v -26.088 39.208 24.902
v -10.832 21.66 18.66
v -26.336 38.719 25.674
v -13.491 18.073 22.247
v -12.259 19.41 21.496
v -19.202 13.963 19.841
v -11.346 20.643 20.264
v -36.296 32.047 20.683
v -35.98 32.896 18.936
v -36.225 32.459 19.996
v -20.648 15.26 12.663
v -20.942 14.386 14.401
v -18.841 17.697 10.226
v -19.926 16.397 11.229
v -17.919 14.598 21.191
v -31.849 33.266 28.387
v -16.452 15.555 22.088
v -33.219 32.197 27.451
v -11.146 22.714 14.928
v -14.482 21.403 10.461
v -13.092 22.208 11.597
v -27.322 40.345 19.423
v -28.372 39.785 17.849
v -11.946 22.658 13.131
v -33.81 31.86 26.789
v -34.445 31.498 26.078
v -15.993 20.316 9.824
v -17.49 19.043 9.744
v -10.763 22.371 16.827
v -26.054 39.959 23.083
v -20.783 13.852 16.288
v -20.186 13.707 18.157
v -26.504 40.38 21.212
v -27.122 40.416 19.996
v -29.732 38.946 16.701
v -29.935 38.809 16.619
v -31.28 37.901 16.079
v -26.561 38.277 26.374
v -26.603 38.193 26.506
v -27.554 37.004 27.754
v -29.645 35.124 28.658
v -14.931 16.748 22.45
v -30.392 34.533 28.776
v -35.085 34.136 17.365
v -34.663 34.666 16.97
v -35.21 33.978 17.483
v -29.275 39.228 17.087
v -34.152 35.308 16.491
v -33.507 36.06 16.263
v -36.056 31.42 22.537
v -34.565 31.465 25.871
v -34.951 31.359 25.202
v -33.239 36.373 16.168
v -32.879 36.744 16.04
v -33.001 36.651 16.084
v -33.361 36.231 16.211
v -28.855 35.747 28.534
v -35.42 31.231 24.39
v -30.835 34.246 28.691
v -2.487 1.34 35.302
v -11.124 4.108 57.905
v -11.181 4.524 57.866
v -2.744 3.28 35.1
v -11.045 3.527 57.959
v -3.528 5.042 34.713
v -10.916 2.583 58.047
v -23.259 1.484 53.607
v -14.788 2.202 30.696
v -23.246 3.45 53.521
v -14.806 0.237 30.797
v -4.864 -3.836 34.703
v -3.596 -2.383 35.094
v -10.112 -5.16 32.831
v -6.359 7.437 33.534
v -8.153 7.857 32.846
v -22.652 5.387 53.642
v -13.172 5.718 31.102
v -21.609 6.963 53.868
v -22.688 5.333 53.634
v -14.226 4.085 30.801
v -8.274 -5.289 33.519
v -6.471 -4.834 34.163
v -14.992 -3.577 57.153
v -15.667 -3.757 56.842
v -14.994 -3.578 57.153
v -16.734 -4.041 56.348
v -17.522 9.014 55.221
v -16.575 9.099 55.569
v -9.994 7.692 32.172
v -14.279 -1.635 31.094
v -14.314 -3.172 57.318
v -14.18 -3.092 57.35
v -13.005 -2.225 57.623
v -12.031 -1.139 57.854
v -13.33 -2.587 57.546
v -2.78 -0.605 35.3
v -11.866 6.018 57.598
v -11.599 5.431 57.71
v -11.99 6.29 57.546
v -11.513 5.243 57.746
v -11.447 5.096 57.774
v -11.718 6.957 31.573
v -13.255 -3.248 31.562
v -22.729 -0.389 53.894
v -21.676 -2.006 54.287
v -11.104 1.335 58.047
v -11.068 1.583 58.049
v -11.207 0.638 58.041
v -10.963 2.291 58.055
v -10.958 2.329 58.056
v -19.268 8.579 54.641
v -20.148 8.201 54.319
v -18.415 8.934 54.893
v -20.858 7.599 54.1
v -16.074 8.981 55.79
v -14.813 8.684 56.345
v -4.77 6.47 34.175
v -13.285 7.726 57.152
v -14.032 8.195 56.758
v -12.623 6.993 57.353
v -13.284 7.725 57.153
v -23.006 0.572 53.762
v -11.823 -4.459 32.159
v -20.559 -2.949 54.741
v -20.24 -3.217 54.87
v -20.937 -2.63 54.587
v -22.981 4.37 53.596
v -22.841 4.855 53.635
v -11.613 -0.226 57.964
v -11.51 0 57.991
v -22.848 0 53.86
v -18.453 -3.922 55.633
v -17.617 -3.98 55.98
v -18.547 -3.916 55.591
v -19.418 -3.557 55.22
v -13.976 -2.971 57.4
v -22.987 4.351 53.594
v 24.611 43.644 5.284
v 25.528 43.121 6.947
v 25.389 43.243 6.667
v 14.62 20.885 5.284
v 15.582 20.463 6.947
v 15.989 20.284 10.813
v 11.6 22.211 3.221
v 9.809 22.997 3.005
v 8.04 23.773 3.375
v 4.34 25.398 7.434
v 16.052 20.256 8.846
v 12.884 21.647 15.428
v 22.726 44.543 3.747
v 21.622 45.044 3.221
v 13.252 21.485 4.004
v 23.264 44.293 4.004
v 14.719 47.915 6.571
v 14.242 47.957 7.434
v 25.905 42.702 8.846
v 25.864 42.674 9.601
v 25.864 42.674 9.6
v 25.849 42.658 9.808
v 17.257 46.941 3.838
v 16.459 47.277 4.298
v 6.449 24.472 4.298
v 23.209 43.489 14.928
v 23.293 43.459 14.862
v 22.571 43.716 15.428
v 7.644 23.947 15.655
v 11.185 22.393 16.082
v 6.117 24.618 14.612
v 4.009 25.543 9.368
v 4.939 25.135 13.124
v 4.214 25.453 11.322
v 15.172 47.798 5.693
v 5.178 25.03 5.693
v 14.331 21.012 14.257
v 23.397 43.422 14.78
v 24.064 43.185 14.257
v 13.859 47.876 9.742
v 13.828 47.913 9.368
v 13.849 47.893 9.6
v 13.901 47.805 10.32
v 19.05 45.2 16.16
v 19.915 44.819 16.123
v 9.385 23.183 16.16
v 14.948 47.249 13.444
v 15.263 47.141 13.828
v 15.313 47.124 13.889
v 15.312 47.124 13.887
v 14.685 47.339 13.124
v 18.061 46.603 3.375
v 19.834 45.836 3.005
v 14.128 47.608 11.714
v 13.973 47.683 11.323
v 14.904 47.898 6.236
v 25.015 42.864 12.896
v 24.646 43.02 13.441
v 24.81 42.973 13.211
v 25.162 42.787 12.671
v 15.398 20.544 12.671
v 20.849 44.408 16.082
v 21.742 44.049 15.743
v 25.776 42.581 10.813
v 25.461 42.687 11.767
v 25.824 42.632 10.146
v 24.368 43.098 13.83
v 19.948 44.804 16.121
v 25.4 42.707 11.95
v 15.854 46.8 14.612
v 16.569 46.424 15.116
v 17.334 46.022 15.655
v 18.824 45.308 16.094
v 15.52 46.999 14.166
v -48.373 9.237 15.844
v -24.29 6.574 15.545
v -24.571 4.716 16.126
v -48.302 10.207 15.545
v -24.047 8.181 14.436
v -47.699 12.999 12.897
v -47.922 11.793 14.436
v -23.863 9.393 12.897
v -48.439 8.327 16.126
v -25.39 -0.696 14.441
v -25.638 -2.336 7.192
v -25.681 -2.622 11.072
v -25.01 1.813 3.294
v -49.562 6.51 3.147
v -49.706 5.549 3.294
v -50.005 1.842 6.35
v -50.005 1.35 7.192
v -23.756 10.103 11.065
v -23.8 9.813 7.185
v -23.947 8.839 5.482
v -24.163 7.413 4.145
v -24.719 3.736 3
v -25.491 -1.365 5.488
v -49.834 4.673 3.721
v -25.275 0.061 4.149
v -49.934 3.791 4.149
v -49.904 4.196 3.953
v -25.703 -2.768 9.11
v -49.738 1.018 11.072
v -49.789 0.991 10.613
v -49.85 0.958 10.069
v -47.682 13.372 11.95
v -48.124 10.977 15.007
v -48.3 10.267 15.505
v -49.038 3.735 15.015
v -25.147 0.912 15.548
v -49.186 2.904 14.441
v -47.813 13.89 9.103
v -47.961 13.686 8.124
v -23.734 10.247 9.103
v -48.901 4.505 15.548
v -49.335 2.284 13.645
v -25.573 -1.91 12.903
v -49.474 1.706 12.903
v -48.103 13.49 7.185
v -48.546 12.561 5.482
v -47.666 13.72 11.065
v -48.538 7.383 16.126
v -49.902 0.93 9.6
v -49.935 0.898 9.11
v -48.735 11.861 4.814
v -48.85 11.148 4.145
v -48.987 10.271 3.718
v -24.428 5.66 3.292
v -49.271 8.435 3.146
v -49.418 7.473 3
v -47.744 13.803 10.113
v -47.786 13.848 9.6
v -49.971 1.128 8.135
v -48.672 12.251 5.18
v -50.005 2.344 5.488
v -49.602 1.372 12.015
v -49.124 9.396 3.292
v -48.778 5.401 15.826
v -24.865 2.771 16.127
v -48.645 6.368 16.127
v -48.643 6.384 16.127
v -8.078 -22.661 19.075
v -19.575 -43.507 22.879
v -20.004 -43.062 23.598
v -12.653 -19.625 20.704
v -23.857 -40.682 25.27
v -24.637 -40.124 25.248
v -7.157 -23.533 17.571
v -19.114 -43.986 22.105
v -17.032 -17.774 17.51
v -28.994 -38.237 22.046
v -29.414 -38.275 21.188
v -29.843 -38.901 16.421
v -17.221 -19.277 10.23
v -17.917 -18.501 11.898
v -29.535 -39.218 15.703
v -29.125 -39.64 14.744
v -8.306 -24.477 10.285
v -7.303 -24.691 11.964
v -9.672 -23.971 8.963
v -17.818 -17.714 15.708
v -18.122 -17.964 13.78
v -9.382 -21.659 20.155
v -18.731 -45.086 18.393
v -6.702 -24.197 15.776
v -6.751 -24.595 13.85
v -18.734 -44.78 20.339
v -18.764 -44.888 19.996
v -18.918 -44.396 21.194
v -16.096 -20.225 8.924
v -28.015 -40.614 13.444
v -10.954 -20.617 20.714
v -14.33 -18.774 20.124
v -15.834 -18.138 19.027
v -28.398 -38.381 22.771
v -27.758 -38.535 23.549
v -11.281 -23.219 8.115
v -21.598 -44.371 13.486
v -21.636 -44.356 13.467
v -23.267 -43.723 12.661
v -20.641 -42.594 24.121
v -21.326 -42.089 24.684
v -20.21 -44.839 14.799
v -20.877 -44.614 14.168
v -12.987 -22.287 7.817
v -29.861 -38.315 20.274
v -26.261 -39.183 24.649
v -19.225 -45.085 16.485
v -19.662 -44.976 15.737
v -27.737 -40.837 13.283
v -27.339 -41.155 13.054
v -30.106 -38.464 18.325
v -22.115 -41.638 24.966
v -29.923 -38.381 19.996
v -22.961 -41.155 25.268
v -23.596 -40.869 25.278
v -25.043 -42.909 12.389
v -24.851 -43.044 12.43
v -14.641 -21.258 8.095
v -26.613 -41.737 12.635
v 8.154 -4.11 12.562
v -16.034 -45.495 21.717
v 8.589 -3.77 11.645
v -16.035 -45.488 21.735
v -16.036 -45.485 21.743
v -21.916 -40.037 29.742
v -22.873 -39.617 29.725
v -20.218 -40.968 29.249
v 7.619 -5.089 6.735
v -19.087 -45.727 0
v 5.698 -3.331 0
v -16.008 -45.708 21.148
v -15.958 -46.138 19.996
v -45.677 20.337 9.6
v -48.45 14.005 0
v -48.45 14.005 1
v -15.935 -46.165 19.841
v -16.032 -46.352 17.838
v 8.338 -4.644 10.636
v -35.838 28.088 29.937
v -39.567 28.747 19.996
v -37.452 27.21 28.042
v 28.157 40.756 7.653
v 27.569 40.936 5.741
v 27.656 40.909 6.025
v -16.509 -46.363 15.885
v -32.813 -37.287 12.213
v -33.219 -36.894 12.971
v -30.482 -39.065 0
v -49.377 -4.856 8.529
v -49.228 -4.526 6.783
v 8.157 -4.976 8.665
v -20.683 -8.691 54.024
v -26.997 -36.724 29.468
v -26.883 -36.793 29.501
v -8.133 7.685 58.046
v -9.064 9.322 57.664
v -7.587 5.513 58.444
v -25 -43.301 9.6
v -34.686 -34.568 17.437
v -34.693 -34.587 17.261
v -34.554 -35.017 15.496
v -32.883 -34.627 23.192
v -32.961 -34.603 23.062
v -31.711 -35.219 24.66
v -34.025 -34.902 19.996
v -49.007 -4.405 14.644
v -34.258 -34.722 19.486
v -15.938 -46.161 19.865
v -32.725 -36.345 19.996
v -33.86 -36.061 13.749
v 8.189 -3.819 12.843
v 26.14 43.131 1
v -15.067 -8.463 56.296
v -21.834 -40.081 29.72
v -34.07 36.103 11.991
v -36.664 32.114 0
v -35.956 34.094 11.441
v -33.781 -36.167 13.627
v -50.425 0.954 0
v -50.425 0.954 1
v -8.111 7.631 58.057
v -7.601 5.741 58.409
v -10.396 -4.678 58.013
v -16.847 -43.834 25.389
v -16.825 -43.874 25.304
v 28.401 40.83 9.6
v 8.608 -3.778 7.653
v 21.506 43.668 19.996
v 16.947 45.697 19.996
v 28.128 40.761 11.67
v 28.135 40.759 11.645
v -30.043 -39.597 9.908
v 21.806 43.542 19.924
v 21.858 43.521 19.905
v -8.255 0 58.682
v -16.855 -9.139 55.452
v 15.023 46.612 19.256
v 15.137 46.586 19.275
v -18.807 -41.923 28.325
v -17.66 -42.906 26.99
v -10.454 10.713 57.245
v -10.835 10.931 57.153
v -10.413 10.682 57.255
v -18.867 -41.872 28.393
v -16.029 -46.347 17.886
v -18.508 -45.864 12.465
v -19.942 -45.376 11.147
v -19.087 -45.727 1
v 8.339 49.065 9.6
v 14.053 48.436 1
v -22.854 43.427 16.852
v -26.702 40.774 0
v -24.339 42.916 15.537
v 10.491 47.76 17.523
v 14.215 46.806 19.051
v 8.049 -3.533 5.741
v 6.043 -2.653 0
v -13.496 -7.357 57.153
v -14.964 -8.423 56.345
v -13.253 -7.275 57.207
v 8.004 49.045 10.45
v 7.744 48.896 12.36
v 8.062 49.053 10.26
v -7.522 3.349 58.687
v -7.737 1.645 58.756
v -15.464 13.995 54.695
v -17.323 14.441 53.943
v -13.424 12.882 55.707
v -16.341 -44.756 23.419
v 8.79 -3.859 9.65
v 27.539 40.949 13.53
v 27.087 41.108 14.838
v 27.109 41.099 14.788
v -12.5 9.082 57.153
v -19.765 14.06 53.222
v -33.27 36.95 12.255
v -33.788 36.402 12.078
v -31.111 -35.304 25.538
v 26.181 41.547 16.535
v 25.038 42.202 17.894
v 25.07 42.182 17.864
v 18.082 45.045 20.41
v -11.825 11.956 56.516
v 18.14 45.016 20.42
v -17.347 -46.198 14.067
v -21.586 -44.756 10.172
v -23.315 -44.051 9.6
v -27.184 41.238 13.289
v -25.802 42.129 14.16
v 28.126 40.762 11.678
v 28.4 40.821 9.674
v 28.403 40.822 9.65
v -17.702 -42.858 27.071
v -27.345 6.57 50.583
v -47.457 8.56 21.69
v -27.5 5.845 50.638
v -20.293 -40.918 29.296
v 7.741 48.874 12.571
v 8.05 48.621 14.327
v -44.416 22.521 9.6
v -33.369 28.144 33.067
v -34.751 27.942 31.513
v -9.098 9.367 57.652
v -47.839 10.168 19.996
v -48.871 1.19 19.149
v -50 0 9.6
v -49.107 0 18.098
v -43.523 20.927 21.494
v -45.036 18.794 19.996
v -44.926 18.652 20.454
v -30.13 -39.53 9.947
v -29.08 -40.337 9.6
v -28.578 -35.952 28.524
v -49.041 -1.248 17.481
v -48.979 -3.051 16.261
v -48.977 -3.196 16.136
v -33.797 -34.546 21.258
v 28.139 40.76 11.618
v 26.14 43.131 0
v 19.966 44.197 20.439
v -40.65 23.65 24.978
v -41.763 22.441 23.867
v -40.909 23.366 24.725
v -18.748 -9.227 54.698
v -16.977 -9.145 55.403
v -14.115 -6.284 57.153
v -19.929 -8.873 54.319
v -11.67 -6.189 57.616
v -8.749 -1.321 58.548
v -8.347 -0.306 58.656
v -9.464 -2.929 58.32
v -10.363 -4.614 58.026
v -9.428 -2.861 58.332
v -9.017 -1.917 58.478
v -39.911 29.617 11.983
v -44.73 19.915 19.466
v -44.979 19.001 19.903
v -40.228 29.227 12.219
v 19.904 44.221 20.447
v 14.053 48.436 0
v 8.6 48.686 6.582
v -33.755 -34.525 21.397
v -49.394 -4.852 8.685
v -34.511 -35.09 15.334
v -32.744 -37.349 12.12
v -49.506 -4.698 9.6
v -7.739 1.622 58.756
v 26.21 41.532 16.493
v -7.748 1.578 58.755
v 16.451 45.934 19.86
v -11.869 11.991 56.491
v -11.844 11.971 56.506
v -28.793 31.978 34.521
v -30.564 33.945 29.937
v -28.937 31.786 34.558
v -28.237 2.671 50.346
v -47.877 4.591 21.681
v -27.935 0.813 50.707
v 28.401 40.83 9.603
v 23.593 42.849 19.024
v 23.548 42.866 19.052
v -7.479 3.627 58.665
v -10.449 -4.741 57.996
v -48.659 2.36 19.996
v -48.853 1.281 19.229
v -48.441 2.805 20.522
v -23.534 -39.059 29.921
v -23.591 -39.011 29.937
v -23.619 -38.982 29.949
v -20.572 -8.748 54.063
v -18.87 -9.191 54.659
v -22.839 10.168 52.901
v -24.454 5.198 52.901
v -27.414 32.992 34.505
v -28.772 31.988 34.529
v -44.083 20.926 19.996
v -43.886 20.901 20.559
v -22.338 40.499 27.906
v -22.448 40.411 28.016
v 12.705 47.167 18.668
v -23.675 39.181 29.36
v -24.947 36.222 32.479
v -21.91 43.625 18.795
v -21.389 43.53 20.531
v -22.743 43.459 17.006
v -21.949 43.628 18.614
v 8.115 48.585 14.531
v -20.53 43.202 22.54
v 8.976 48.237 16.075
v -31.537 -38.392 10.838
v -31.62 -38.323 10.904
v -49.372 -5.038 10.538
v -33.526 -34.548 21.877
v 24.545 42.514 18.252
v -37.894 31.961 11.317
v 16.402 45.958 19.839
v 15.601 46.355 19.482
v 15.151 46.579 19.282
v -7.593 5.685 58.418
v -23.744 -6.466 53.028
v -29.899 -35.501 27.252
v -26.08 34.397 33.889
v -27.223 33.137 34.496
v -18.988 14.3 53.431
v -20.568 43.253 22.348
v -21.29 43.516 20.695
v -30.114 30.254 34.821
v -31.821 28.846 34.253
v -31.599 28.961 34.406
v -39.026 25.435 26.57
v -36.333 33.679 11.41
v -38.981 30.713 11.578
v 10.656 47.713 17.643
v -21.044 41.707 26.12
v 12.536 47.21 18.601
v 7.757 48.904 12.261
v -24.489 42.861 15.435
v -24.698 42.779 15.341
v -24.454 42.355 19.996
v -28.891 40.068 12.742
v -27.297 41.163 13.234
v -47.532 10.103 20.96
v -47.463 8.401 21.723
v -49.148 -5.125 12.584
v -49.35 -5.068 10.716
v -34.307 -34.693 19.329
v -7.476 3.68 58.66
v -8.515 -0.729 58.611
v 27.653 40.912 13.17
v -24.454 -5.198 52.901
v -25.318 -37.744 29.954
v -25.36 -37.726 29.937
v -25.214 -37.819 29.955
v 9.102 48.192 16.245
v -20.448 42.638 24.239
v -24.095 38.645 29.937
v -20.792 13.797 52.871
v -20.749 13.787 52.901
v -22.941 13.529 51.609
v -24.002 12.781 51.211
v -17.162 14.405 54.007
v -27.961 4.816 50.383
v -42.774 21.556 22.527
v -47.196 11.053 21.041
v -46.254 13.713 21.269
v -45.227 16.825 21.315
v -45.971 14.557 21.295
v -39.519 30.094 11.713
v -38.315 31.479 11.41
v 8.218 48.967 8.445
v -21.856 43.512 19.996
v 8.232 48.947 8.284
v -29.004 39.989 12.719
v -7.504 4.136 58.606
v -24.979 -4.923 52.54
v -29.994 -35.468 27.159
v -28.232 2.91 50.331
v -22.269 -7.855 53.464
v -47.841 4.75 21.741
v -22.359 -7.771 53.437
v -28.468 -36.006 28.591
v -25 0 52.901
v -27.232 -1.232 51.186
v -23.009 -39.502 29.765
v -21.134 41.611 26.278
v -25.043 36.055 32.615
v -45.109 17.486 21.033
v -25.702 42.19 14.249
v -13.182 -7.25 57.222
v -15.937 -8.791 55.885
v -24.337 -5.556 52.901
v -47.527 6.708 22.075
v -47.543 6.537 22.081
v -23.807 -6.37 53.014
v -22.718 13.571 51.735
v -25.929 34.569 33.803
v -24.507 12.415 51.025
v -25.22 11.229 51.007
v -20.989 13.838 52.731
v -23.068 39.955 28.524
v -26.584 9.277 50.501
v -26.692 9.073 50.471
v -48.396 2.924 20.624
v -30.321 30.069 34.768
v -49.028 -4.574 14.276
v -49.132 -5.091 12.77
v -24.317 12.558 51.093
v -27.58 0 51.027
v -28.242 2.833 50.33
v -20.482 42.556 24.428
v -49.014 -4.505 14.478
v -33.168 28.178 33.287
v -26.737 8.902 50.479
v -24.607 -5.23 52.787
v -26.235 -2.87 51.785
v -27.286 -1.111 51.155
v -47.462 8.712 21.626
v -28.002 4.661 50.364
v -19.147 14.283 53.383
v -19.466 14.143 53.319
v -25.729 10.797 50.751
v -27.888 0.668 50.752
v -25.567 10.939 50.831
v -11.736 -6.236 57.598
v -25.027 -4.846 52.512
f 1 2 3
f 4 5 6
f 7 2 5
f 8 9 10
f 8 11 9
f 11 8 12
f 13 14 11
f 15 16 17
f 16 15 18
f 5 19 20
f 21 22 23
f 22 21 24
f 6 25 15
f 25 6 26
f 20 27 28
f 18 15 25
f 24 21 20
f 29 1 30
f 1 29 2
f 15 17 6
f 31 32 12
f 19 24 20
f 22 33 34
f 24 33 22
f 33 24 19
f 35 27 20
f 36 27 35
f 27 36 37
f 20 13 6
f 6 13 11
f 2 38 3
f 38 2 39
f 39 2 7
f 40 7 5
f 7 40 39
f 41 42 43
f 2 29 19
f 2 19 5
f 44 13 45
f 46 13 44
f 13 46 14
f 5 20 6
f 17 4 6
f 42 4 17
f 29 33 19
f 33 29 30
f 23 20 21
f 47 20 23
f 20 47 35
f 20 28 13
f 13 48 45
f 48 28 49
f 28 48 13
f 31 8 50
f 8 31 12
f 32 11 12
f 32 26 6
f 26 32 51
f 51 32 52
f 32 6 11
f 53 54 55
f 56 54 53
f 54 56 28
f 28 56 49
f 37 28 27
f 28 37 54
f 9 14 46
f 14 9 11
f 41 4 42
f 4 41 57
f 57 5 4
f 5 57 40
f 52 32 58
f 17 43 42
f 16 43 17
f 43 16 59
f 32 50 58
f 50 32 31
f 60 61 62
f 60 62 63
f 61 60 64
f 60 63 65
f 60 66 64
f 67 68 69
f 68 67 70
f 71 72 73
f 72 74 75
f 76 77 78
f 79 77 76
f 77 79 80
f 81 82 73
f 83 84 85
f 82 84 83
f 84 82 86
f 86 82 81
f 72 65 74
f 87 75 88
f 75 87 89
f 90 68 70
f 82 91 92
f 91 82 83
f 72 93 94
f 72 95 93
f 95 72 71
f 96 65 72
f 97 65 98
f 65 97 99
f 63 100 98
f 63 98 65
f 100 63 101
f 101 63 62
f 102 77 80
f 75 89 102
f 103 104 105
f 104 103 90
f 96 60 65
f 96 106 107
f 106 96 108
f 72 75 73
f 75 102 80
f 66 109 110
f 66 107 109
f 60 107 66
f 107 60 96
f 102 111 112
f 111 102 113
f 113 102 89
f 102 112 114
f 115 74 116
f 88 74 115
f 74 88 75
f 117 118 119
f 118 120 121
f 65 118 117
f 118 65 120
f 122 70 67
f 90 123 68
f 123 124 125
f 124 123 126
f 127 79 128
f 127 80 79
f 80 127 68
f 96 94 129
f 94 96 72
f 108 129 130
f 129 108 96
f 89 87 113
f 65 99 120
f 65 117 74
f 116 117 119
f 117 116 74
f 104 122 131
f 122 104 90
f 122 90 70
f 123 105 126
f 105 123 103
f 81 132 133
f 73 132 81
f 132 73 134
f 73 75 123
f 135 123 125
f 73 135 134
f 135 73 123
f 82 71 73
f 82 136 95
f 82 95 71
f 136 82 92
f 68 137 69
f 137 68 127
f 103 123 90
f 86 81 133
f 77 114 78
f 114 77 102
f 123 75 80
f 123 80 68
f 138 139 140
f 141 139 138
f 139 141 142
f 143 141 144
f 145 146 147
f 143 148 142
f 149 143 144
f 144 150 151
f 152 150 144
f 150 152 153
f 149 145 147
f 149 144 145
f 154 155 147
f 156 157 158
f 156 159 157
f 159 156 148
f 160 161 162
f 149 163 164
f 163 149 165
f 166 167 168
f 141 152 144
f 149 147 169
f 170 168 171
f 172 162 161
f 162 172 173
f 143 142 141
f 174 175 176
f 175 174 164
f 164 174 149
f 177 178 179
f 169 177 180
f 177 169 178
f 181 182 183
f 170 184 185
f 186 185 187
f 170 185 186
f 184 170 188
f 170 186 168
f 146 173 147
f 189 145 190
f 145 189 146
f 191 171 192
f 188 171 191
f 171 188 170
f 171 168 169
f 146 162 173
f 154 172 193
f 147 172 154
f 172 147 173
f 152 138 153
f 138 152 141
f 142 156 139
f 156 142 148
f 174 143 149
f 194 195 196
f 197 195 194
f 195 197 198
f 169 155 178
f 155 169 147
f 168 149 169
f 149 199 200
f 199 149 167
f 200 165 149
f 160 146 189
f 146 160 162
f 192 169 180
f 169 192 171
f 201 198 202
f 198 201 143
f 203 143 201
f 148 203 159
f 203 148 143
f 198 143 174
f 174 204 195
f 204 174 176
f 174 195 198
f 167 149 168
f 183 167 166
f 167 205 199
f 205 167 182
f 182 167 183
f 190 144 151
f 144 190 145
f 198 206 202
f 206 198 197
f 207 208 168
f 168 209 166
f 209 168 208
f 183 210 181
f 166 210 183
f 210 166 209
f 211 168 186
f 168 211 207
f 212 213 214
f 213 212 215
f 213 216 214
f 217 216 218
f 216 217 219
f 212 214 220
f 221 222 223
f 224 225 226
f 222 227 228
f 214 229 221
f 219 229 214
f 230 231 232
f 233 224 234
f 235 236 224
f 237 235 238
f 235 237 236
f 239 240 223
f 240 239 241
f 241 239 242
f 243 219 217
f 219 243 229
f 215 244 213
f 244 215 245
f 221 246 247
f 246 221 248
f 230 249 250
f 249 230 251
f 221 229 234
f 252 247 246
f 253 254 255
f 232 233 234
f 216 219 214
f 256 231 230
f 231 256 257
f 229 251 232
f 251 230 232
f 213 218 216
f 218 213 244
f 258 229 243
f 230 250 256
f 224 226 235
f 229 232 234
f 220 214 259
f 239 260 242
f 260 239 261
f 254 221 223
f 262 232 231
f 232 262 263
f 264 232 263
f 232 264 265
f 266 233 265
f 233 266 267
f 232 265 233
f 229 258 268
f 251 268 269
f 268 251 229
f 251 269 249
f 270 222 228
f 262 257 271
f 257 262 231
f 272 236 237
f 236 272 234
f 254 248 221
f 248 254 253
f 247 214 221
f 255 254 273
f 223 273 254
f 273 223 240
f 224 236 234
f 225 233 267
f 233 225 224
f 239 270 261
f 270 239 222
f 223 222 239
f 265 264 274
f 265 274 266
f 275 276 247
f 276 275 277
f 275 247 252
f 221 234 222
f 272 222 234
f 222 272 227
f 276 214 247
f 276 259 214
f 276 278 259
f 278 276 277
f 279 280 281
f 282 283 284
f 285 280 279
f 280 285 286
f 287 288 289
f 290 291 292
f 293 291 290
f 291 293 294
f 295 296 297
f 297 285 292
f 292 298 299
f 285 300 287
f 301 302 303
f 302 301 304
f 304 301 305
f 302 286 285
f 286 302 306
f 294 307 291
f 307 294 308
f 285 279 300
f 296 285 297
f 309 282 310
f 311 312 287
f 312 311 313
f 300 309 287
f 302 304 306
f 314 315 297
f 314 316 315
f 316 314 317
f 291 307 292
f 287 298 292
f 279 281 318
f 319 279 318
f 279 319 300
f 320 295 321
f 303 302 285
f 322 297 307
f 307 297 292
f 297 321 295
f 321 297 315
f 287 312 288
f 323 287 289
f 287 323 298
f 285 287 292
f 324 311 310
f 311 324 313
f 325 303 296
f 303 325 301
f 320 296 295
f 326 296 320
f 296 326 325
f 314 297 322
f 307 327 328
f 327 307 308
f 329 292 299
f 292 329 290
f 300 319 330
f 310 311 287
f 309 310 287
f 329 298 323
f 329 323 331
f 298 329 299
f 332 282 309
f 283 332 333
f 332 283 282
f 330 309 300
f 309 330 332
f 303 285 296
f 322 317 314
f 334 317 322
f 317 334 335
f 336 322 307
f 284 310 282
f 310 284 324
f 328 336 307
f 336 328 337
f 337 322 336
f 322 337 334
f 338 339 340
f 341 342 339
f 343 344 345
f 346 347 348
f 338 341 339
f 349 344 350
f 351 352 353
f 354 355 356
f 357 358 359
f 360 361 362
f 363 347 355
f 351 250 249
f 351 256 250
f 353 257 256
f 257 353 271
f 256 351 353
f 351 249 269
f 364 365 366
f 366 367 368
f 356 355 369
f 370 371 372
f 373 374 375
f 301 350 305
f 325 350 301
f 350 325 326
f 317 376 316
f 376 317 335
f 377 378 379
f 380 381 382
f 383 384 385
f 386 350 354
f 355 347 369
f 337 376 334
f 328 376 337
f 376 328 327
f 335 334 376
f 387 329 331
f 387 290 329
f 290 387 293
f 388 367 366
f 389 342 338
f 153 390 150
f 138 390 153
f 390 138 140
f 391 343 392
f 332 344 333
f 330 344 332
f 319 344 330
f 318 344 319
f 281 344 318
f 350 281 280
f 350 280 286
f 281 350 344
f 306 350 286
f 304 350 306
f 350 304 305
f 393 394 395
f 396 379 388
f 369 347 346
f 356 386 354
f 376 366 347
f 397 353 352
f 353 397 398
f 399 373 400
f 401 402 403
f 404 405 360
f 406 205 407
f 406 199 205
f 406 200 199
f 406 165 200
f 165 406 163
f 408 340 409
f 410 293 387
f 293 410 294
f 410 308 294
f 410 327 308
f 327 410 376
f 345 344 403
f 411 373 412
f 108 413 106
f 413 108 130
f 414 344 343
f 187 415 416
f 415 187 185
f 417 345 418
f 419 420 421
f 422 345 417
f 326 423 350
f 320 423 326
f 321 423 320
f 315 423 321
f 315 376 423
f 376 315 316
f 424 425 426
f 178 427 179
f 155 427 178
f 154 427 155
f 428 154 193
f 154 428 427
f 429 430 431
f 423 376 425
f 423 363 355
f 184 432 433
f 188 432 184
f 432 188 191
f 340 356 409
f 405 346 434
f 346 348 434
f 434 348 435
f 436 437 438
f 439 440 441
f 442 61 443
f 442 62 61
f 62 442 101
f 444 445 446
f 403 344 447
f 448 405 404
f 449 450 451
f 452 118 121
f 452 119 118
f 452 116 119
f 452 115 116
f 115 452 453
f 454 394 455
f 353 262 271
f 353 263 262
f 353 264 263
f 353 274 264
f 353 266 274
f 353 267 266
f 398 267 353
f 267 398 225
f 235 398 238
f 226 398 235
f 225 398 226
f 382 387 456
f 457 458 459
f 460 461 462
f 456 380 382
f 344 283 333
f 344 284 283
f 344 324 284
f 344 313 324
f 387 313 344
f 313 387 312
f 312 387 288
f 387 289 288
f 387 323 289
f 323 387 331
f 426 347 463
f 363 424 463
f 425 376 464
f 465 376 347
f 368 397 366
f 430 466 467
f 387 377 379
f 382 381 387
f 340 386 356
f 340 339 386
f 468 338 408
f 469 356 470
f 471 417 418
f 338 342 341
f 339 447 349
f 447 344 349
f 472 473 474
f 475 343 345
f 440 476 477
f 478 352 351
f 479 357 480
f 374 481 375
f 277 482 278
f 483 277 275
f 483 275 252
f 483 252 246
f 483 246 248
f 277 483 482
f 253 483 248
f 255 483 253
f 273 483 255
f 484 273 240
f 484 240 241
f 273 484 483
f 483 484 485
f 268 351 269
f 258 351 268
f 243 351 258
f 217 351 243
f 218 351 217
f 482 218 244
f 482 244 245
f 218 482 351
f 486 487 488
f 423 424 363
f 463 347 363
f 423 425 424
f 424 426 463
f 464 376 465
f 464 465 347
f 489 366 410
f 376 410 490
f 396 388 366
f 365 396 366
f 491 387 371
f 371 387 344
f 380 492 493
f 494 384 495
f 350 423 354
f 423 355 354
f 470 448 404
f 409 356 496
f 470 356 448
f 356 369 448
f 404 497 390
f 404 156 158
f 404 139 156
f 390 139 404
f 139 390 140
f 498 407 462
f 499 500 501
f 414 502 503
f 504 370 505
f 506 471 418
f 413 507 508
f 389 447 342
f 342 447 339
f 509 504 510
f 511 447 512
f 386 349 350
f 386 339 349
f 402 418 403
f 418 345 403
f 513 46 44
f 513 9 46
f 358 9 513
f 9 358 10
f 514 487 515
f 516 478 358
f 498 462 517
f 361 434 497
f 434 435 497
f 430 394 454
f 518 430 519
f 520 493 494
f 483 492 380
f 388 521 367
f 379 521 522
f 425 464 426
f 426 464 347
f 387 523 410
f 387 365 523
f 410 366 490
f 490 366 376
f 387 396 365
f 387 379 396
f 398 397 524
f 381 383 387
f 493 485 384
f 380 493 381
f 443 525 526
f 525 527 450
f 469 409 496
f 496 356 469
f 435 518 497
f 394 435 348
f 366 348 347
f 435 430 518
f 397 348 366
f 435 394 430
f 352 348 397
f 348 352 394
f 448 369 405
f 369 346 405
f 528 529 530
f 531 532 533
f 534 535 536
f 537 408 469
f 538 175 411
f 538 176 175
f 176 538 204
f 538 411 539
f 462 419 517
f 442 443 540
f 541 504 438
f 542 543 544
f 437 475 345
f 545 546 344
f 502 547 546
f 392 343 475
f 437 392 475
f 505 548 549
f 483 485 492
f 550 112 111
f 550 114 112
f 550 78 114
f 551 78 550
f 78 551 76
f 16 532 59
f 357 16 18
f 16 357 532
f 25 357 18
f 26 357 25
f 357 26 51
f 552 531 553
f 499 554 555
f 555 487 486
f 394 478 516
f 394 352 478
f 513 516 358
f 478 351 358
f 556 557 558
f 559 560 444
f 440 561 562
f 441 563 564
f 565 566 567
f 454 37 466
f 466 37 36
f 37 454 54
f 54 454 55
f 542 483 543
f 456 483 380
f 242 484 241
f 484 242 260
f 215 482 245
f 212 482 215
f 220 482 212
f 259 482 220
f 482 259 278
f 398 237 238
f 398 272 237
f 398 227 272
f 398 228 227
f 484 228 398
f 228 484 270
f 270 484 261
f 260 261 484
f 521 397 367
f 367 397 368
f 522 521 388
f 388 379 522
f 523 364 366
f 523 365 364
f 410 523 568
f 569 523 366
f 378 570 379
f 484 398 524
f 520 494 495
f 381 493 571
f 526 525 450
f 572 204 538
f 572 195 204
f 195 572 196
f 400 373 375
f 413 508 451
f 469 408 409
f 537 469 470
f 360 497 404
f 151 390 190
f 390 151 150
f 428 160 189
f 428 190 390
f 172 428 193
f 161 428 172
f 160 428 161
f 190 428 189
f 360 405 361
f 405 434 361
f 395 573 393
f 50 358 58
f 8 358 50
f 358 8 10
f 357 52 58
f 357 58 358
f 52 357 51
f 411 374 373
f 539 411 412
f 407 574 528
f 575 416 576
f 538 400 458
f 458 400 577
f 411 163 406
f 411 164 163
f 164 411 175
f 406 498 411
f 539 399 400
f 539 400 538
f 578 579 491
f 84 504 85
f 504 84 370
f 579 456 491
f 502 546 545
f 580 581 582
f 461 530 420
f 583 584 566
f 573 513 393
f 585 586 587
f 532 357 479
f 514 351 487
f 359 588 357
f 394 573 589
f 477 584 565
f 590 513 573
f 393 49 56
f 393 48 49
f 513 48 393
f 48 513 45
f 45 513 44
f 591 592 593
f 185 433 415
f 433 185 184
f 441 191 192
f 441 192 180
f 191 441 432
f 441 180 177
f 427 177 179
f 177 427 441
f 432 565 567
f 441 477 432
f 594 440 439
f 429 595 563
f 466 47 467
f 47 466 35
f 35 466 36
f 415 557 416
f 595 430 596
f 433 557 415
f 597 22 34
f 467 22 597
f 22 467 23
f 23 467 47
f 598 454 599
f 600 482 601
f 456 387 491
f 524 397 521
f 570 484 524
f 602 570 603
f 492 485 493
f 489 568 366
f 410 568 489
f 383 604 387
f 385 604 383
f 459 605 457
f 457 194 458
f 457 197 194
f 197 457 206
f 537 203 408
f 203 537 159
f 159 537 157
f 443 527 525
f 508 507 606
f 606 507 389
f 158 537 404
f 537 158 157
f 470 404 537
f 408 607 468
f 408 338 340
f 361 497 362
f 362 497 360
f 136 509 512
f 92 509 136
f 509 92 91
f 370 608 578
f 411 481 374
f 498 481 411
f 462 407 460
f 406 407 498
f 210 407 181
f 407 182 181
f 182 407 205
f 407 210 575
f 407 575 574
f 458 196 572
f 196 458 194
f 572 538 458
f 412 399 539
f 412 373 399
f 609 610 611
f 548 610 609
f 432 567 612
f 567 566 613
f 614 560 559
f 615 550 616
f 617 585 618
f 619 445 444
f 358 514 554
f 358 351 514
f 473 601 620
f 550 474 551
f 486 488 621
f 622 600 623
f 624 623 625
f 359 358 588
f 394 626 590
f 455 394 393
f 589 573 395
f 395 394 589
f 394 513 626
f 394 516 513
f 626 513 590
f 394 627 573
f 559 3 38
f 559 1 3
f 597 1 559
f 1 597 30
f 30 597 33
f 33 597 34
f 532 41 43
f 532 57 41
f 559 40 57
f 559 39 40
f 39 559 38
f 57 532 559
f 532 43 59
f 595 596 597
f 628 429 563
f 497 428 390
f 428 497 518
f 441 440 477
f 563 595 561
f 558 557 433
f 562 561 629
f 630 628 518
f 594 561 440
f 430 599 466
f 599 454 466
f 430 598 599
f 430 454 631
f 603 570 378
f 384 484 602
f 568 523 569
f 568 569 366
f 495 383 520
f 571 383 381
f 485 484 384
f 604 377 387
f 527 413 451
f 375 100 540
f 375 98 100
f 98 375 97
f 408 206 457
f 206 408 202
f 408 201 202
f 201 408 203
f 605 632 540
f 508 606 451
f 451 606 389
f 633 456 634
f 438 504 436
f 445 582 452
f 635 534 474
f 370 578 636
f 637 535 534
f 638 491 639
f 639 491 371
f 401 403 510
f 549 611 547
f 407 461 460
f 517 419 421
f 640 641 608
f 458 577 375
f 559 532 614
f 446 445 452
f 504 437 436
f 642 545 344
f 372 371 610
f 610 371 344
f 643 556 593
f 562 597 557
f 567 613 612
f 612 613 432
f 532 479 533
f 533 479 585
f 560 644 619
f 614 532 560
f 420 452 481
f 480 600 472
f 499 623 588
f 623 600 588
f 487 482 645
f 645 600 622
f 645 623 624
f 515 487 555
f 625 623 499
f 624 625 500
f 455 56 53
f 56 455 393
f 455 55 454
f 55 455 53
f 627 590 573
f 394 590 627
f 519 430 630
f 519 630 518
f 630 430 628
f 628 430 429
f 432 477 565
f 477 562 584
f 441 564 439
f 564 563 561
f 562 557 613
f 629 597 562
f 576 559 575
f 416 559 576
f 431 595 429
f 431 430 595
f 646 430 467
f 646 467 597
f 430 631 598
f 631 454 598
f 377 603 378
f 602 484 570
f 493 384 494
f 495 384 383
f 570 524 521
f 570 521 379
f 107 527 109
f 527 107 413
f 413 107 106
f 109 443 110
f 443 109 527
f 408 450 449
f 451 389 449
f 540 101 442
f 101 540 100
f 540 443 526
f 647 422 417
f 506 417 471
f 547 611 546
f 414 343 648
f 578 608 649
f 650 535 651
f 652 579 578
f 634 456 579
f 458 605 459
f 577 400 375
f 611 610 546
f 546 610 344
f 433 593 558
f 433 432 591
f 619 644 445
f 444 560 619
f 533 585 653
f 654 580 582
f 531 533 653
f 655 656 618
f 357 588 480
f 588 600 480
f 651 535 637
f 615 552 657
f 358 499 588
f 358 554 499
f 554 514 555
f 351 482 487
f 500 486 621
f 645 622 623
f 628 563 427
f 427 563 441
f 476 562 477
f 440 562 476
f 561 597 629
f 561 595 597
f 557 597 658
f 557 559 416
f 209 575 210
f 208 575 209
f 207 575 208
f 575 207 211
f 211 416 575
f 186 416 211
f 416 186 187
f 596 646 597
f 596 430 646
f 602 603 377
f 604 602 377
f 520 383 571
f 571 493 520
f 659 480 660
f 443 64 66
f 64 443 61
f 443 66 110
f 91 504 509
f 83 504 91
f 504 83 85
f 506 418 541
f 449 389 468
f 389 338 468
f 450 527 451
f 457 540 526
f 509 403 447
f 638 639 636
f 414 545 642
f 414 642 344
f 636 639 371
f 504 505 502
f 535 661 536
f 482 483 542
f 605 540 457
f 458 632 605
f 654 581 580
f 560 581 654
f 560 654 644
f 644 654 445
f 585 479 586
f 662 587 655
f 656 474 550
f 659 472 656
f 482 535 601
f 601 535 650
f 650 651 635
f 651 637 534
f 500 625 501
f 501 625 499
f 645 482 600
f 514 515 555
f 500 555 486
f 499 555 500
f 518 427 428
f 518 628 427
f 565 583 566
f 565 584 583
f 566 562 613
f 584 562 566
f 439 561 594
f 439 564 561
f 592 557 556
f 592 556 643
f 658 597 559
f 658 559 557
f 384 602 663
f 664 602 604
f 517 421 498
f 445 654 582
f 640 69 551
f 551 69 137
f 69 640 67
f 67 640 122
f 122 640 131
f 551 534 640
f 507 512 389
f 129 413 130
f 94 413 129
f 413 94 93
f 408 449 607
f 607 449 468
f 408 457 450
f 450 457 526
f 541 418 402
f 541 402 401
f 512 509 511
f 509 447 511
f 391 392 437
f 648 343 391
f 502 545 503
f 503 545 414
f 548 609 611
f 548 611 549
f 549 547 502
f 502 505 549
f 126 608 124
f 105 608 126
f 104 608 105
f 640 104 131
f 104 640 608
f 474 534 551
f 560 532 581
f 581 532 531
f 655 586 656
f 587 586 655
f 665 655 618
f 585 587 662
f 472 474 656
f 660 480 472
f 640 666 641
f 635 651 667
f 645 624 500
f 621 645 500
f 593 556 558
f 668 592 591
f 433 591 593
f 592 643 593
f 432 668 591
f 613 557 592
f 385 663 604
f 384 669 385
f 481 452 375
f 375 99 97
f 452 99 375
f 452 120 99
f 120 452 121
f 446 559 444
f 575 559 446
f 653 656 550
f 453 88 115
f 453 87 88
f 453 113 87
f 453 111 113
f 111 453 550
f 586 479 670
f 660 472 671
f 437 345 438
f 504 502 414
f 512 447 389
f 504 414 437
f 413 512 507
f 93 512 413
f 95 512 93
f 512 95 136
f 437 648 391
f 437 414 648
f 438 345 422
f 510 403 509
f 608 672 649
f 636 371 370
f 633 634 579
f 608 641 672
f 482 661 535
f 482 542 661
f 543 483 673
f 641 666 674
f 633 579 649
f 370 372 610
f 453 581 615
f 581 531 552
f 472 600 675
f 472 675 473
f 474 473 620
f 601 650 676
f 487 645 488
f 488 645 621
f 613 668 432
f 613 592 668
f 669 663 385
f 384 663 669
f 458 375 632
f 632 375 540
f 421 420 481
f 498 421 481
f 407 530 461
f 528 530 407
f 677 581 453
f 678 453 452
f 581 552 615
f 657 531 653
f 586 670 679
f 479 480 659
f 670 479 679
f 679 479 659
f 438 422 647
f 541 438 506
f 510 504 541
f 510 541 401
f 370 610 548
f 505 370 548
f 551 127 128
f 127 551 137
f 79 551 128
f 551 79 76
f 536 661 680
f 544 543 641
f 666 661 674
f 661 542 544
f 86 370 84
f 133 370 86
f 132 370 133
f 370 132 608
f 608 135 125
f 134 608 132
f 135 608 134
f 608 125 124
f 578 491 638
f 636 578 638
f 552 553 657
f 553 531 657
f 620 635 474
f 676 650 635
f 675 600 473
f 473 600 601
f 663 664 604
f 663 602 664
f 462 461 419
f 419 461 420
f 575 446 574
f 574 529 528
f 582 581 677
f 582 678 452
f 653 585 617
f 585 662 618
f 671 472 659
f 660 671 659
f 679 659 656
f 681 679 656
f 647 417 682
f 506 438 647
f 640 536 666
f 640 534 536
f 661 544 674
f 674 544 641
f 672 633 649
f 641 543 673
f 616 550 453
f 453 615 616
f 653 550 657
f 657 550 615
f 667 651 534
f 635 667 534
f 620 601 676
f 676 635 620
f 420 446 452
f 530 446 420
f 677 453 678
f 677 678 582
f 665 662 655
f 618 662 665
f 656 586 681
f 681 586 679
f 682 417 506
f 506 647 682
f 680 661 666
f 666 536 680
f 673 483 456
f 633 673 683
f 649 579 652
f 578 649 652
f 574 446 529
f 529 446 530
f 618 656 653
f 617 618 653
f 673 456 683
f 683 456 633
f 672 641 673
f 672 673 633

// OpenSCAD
difference() {
	hull() {
		union() {
			union() {
				rotate(a = 131.0021079645, v = [0, 0, 1]) {
					translate(v = [0, -6.6000000000, 0]) {
						cube(size = [48.2903430133, 13.2000000000, 1]);
					}
				}
				rotate(a = 171.6103322766, v = [0, 0, 1]) {
					translate(v = [0, -6.6000000000, 0]) {
						cube(size = [17.5400087140, 13.2000000000, 1]);
					}
				}
				rotate(a = 66.3006273748, v = [0, 0, 1]) {
					translate(v = [0, -6.6000000000, 0]) {
						cube(size = [50.0000000000, 13.2000000000, 1]);
					}
				}
				rotate(a = 171.3968776740, v = [0, 0, 1]) {
					translate(v = [0, -6.6000000000, 0]) {
						cube(size = [50.0000000000, 13.2000000000, 1]);
					}
				}
				rotate(a = -120.3103406068, v = [0, 0, 1]) {
					translate(v = [0, -6.6000000000, 0]) {
						cube(size = [49.1087052890, 13.2000000000, 1]);
					}
				}
			}
			translate(v = [0, 0, 9.6000000000]) {
				intersection() {
					hull() {
						rotate(a = 74.9736809283, v = [-0.7288801186, -0.6336533868, 0.0000013625]) {
							cylinder(h = 50, r = 9.6000000000);
						}
						rotate(a = 20.5363134754, v = [-0.0511824327, -0.3470470789, 0.0000003982]) {
							cylinder(h = 50, r = 9.6000000000);
						}
						rotate(a = 89.9999169575, v = [-0.9156669945, 0.4019377503, 0.0000005137]) {
							cylinder(h = 50, r = 9.6000000000);
						}
						rotate(a = 90.0000528883, v = [-0.1495892254, -0.9887482307, 0.0000011383]) {
							cylinder(h = 50, r = 9.6000000000);
						}
						rotate(a = 79.1655365112, v = [0.8479154942, -0.4956871936, -0.0000003522]) {
							cylinder(h = 50, r = 9.6000000000);
						}
					}
					sphere(r = 50);
				}
			}
		}
	}
	translate(v = [0, 0, 9.6000000000]) {
		rotate(a = 74.9736809283, v = [-0.7288801186, -0.6336533868, 0.0000013625]) {
			translate(v = [0, 0, 25]) {
				cylinder(h = 50, r = 6.6000000000);
			}
		}
		rotate(a = 20.5363134754, v = [-0.0511824327, -0.3470470789, 0.0000003982]) {
			translate(v = [0, 0, 25]) {
				cylinder(h = 50, r = 6.6000000000);
			}
		}
		rotate(a = 89.9999169575, v = [-0.9156669945, 0.4019377503, 0.0000005137]) {
			translate(v = [0, 0, 25]) {
				cylinder(h = 50, r = 6.6000000000);
			}
		}
		rotate(a = 90.0000528883, v = [-0.1495892254, -0.9887482307, 0.0000011383]) {
			translate(v = [0, 0, 25]) {
				cylinder(h = 50, r = 6.6000000000);
			}
		}
		rotate(a = 79.1655365112, v = [0.8479154942, -0.4956871936, -0.0000003522]) {
			translate(v = [0, 0, 25]) {
				cylinder(h = 50, r = 6.6000000000);
			}
		}
	}
}
